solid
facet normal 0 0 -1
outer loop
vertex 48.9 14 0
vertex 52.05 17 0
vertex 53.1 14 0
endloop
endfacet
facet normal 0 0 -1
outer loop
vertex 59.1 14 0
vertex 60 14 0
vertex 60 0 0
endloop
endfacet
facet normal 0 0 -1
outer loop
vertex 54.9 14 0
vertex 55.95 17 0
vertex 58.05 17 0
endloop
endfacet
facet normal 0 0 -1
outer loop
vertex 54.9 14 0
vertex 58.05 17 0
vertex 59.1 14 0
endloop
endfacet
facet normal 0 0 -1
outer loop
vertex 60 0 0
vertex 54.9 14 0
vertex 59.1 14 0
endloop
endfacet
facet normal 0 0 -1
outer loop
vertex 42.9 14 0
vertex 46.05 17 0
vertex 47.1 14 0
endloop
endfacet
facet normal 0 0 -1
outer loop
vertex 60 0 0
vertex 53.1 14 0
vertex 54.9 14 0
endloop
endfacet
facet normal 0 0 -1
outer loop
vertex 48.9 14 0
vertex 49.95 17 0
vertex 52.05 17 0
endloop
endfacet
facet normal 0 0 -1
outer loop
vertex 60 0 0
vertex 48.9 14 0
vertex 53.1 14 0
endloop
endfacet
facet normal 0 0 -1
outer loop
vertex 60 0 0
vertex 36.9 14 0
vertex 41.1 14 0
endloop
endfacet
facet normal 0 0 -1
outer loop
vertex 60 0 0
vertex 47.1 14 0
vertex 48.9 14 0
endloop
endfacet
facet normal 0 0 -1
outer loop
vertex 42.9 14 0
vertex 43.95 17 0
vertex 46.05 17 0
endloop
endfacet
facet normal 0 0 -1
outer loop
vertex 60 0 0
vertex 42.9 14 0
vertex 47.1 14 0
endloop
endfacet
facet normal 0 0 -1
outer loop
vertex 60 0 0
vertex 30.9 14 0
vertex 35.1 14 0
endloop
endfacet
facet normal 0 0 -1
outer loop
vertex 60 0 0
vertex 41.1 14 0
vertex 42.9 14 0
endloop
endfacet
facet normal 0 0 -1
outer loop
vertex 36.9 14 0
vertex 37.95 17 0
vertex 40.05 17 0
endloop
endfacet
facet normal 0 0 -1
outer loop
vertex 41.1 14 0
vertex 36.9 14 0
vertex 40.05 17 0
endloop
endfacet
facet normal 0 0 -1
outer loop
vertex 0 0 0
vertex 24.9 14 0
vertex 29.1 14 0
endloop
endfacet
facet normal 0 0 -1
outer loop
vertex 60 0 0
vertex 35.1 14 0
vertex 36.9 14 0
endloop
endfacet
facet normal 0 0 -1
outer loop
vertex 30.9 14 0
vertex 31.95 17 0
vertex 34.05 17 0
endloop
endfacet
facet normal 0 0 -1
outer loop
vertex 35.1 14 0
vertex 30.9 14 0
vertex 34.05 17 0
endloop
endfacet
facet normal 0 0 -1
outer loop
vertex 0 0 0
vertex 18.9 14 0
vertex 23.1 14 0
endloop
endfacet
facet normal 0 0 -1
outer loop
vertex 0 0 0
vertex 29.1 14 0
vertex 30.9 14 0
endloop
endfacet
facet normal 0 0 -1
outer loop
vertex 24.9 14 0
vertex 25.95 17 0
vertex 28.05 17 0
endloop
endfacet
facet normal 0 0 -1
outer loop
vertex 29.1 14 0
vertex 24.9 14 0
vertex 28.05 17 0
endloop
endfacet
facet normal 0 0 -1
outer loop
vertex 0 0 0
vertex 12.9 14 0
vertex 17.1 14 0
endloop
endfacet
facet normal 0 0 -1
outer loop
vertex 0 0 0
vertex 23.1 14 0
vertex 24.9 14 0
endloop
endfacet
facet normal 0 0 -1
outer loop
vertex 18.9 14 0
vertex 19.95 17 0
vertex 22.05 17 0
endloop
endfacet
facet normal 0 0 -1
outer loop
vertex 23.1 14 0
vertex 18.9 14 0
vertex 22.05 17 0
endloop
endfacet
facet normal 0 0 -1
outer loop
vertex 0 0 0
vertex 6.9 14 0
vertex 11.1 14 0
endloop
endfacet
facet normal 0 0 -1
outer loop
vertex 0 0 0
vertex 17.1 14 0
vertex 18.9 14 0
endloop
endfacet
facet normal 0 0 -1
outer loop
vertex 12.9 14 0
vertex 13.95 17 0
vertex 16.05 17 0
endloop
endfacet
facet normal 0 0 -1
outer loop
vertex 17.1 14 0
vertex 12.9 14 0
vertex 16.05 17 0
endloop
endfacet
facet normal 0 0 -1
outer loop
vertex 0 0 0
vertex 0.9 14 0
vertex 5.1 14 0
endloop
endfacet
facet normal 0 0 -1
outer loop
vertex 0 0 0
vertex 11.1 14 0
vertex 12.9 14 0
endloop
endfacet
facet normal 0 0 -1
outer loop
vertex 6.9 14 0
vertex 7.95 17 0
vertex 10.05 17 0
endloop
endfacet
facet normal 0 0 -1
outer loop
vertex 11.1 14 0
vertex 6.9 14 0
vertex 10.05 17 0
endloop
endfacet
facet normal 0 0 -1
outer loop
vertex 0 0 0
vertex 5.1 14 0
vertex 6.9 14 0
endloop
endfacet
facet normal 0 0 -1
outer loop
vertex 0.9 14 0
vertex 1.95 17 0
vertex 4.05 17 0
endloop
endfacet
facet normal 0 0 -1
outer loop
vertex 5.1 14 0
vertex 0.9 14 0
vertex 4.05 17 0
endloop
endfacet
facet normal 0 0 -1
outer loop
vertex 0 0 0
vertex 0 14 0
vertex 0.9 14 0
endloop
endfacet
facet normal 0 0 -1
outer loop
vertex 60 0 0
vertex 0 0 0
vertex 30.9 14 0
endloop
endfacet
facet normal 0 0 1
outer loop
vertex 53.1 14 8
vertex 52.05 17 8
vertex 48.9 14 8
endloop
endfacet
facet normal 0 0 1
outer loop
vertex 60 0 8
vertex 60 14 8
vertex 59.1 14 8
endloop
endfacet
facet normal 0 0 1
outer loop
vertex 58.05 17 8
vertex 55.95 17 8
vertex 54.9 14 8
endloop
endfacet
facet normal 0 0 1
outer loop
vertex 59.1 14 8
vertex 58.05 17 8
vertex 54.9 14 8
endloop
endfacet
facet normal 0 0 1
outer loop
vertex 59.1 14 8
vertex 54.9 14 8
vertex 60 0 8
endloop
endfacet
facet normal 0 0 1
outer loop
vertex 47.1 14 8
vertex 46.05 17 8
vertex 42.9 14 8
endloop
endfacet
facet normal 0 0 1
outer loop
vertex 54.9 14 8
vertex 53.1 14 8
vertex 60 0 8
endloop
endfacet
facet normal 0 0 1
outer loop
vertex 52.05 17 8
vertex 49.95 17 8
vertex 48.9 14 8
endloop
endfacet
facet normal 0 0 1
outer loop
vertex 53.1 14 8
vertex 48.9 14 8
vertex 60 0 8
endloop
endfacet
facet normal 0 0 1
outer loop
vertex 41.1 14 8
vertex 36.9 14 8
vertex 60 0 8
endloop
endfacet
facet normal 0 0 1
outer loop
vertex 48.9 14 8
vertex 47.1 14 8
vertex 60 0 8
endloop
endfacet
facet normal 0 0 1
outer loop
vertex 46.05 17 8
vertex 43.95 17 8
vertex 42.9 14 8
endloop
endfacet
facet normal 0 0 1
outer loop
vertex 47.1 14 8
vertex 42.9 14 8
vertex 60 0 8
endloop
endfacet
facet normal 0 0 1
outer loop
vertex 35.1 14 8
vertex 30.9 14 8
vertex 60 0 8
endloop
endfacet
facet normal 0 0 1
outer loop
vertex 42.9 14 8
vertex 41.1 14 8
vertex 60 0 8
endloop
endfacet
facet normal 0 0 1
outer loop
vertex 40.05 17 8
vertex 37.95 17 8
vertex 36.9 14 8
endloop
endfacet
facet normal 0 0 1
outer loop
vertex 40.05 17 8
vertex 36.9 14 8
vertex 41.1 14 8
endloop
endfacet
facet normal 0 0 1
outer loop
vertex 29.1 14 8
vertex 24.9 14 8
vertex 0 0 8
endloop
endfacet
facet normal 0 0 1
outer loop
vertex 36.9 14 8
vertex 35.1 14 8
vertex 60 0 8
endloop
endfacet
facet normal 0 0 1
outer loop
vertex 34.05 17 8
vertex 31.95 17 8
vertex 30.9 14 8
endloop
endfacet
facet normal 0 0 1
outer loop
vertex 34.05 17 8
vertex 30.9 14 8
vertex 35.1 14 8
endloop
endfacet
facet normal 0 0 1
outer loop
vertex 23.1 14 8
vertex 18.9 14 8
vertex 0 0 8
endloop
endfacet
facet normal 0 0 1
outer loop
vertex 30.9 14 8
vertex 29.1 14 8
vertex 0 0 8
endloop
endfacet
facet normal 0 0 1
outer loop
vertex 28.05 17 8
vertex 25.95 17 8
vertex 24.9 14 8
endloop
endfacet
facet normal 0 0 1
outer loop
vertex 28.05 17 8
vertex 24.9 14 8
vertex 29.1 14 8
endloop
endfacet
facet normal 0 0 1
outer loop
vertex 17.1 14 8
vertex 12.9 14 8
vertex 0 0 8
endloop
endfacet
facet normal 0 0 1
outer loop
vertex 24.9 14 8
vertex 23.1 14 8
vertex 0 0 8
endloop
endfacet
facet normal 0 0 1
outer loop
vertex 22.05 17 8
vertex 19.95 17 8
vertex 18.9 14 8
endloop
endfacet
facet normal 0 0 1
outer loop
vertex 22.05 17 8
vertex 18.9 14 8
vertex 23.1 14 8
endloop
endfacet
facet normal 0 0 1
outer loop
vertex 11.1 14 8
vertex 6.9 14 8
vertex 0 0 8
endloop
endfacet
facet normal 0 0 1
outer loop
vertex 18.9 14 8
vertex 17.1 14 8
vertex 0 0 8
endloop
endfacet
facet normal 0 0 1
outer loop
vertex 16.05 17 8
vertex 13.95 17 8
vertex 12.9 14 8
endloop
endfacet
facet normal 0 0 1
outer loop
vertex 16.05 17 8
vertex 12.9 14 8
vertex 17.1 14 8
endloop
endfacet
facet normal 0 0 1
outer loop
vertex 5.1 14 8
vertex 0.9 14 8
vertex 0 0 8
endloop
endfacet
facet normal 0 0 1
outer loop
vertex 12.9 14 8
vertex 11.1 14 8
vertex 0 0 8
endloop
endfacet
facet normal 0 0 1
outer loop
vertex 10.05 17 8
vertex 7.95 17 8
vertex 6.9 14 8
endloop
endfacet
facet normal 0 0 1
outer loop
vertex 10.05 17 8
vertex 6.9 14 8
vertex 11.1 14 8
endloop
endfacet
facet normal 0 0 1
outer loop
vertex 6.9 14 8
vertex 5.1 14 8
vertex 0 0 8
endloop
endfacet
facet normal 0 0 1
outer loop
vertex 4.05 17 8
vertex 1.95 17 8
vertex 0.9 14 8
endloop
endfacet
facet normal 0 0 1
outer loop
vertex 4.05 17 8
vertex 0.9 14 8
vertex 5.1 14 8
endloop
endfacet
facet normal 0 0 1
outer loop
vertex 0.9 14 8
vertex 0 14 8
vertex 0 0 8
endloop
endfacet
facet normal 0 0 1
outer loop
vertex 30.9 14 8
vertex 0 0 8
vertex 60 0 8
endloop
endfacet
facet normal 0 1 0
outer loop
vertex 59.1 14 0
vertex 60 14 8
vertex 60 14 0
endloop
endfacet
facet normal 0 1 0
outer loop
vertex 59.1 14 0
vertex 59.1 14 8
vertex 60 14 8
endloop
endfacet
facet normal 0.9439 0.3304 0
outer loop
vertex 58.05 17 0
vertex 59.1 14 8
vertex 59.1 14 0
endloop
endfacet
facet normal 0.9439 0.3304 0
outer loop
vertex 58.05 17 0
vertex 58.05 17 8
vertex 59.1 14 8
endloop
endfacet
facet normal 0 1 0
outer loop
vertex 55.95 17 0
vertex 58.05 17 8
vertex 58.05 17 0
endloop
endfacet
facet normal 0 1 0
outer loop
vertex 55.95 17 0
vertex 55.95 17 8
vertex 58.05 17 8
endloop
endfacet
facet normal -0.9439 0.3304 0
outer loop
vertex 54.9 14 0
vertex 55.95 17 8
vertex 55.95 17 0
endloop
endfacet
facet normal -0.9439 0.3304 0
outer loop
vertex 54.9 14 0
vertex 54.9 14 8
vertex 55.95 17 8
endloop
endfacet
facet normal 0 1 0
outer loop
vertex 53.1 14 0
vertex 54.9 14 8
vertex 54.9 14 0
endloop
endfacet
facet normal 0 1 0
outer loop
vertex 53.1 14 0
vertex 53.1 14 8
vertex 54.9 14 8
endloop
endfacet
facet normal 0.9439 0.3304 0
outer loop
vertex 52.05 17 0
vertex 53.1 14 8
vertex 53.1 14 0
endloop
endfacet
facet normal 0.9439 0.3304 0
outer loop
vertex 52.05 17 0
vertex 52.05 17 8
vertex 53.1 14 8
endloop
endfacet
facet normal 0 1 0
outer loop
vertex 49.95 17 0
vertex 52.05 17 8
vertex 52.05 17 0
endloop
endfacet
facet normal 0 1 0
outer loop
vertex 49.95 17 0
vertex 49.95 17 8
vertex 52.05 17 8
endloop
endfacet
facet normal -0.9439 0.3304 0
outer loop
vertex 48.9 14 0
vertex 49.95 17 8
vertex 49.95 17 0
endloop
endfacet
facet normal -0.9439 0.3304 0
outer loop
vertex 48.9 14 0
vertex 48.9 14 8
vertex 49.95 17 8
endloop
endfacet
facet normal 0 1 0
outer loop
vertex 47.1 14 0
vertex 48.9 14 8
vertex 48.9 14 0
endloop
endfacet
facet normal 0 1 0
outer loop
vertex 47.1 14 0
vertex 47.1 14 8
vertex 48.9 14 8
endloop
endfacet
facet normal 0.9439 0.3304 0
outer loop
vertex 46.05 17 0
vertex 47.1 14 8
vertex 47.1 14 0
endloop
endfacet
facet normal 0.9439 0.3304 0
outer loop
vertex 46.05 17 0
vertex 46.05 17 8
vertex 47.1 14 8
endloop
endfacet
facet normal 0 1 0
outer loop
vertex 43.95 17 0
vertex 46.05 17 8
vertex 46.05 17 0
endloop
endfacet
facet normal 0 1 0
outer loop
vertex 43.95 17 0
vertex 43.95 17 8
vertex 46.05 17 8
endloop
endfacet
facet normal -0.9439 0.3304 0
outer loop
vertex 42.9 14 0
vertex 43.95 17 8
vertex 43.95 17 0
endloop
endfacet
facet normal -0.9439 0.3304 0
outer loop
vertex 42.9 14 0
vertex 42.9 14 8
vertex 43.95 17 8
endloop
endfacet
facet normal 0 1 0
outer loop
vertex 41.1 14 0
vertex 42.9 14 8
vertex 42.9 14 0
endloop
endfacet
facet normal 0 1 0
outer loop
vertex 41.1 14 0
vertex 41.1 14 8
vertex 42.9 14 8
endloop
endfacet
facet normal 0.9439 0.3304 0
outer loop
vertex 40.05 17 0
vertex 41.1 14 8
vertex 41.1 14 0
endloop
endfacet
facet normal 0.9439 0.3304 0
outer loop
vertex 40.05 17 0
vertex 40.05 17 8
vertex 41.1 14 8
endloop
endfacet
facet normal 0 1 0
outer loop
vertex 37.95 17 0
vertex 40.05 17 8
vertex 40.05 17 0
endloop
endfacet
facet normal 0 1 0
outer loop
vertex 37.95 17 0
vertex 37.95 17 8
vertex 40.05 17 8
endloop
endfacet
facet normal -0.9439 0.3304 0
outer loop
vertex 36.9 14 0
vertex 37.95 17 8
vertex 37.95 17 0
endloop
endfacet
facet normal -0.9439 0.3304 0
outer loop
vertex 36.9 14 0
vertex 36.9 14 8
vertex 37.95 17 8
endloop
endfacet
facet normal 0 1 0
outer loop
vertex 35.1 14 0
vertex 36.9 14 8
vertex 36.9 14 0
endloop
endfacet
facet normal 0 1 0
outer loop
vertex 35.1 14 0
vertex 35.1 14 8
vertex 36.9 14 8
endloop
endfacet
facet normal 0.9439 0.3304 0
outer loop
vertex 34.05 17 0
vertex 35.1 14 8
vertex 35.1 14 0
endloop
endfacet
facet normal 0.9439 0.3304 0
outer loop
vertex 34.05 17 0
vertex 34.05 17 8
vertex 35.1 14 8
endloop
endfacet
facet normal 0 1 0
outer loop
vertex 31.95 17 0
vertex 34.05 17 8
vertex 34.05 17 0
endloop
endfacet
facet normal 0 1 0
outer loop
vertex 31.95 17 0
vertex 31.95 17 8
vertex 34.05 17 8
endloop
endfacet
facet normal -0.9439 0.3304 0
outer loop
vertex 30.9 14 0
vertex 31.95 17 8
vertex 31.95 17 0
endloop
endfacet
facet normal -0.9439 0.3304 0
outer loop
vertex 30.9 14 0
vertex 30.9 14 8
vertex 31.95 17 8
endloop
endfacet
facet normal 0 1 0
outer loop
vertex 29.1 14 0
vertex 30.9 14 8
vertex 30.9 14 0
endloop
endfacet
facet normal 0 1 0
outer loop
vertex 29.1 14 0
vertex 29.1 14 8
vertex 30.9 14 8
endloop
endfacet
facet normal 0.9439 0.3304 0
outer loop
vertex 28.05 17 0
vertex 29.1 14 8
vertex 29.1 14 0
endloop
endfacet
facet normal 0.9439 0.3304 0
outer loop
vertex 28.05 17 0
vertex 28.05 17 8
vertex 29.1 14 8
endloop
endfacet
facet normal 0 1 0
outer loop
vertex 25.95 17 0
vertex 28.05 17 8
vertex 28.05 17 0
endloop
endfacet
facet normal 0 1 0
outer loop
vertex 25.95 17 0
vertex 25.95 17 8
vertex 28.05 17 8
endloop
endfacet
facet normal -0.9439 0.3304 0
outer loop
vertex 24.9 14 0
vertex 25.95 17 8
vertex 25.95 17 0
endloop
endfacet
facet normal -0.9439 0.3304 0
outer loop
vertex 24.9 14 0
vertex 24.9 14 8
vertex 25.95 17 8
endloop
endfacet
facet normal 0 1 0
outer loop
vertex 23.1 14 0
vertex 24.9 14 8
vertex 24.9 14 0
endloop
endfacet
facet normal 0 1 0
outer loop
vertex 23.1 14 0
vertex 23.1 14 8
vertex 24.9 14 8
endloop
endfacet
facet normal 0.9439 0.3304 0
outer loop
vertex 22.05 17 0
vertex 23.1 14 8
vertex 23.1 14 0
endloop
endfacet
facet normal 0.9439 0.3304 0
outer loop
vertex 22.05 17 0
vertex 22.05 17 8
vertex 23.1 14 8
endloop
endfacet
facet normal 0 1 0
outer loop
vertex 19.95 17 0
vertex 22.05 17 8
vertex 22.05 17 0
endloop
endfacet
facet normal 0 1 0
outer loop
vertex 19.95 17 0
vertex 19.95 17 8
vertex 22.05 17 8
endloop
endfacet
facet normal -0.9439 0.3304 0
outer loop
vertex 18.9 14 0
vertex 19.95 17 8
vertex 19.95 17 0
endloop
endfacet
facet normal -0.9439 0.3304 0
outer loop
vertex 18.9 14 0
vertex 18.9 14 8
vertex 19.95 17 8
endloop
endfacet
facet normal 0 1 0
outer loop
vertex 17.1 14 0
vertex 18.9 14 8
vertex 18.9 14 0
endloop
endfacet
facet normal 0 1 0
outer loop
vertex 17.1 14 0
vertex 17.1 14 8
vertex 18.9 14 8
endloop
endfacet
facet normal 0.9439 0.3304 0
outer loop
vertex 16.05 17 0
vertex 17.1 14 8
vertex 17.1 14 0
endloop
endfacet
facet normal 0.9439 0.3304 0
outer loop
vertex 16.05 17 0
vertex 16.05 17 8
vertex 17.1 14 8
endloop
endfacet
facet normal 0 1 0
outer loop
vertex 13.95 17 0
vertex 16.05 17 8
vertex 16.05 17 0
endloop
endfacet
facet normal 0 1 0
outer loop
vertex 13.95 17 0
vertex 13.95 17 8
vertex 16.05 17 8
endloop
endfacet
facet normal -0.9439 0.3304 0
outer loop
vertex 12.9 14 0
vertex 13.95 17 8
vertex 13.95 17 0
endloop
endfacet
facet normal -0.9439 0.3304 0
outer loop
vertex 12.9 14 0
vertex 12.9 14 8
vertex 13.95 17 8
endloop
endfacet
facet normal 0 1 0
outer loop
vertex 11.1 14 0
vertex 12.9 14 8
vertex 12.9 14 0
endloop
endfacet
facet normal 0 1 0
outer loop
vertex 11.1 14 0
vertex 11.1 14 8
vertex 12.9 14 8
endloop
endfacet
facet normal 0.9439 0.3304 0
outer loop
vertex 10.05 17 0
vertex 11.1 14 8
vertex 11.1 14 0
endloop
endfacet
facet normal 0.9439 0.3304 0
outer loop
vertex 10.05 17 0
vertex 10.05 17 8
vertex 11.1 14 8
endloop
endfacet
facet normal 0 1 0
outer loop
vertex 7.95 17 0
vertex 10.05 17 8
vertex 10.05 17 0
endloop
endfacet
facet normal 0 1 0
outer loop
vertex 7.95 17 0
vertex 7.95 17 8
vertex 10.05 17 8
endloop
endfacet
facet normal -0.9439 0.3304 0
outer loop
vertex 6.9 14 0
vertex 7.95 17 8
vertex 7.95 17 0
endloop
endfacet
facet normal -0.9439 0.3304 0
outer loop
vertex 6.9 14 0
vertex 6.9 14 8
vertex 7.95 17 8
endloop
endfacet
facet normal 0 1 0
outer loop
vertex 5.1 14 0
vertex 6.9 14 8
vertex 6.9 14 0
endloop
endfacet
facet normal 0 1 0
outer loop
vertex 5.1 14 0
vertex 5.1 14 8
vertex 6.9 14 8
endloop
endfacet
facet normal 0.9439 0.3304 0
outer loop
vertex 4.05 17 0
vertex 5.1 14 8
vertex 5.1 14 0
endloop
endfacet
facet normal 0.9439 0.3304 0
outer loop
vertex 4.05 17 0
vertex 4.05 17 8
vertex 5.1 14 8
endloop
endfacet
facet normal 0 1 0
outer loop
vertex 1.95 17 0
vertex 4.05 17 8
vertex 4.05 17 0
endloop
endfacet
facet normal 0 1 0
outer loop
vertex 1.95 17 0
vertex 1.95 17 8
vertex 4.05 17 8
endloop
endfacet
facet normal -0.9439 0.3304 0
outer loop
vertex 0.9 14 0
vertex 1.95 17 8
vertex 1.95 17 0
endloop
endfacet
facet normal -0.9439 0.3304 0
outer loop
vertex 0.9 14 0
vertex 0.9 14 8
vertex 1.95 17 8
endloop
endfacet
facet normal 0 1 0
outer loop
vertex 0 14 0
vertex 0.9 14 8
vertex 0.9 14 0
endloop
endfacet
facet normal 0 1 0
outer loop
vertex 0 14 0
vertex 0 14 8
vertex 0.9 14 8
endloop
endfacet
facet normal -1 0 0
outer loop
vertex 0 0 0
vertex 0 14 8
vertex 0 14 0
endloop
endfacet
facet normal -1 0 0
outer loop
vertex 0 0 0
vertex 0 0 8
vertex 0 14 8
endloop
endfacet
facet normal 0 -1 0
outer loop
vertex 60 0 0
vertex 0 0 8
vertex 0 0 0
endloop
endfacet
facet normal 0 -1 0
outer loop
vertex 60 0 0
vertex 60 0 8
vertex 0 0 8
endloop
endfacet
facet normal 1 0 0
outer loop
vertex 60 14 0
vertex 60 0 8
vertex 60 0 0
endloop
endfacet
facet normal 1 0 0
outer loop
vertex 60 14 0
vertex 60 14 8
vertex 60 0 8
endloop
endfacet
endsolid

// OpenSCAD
$fn = 32;

// ----------------------------------------------------------------------
// Gear rack: 10 teeth, pitch 6 mm
// ----------------------------------------------------------------------

// --- parameters (mm) ---
teeth = 10;               // number of teeth
pitch = 6;                // tooth pitch, X
root_w = 4.2;             // tooth width at the root
tip_w = 2.1;              // tooth width at the tip
base_h = 14;              // rack body height, Y
tooth_h = 3;              // tooth height above the body
plate_t = 8;              // rack width, Z (extrusion height)
fit_tol = 0.05;           // declared fit tolerance (prompt contract)
free_tol = 0.2;           // declared free tolerance (prompt contract)

rack_l = teeth * pitch;  // overall length
total_h = base_h + tooth_h;  // overall height

profile = [[0, 0], [60, 0], [60, 14], [59.1, 14], [58.05, 17], [55.95, 17], [54.9, 14], [53.1, 14], [52.05, 17], [49.95, 17], [48.9, 14], [47.1, 14], [46.05, 17], [43.95, 17], [42.9, 14], [41.1, 14], [40.05, 17], [37.95, 17], [36.9, 14], [35.1, 14], [34.05, 17], [31.95, 17], [30.9, 14], [29.1, 14], [28.05, 17], [25.95, 17], [24.9, 14], [23.1, 14], [22.05, 17], [19.95, 17], [18.9, 14], [17.1, 14], [16.05, 17], [13.95, 17], [12.9, 14], [11.1, 14], [10.05, 17], [7.95, 17], [6.9, 14], [5.1, 14], [4.05, 17], [1.95, 17], [0.9, 14], [0, 14]];  // primary outline, 44 points, counter clockwise

// --- the one profile operation ---
linear_extrude(height = plate_t) polygon(points = profile);
